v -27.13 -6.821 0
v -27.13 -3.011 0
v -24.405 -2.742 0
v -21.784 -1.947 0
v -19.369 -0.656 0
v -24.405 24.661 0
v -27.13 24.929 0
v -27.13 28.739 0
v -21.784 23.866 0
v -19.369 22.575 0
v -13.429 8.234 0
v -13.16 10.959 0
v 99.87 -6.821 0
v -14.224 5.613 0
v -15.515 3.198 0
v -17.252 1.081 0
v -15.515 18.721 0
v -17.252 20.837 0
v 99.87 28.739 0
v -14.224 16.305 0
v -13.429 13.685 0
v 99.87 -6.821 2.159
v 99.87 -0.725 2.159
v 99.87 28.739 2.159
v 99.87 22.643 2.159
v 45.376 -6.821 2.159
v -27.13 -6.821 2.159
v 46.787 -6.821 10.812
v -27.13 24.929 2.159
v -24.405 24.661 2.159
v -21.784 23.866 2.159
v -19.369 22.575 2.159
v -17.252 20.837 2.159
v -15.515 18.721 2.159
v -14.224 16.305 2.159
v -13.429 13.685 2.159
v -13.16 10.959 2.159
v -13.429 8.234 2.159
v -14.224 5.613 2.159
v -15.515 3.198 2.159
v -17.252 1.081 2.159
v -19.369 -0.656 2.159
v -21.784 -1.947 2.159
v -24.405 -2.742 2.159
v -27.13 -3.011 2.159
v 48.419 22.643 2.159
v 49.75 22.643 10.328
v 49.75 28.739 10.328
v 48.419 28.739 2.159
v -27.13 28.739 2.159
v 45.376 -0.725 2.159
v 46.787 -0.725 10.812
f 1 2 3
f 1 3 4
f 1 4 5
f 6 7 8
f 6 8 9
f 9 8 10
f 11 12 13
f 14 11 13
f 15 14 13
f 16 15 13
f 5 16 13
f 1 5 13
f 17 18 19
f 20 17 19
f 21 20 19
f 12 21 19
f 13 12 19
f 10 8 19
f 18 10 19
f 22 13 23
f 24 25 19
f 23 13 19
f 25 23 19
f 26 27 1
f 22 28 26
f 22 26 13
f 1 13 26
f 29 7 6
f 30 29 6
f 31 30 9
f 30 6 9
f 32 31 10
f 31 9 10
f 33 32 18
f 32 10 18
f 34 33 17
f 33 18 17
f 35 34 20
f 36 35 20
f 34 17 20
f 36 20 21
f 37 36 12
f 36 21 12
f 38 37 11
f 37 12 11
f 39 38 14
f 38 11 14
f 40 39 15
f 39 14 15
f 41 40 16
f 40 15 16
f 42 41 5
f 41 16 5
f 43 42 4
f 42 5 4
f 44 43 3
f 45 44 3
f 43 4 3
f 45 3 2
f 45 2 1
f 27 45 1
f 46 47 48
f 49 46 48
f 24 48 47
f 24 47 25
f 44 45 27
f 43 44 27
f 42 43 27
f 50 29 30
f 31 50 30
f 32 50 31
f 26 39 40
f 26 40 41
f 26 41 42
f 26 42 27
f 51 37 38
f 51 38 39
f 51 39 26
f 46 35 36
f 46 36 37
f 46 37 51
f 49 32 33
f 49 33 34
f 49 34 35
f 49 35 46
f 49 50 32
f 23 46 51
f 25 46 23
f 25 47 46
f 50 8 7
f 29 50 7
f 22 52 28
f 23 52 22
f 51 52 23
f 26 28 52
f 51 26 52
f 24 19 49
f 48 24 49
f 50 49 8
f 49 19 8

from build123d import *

# Parameters (mm, degrees)
F1_DEPTH = 2.159
F5_W     = 53.7838474663
F5_H     = 6.096
F5_W_2   = 50.7808425279


with BuildPart() as f1:
    # F0 (on Top) → F1 (new body)
    with BuildSketch(Plane.XY):
        with BuildLine():
            Line((-27.1301528547, -3.0107952586), (-27.1301528547, -6.8207952586))
            Line((-27.1301528547, -6.8207952586), (99.8698471453, -6.8207952586))
            Line((99.8698471453, -6.8207952586), (99.8698471453, 28.7392047414))
            Line((99.8698471453, 28.7392047414), (-27.1301528547, 28.7392047414))
            Line((-27.1301528547, 28.7392047414), (-27.1301528547, 24.9292047414))
            ThreePointArc((-27.1301528547, 24.9292047414), (-13.1601528547, 10.9592047414), (-27.1301528547, -3.0107952586))
        make_face()
    extrude(amount=F1_DEPTH)

    # F5 (on 3pt) → F6 (join, up to the next surface of F1)
    with BuildSketch(Plane(origin=(2.9275761968, 0, 17.9605901646), x_dir=(0.9869744889, 0, -0.1608768417), z_dir=(0.1608768417, 0, 0.9869744889))):
        with Locations((71.3297345118, -3.7727952586)):
            Rectangle(F5_W, F5_H)
        with Locations((72.8312369809, 25.6912047414)):
            Rectangle(F5_W_2, F5_H)
    extrude(until=Until.NEXT, dir=(-0.1608768417, 0, -0.9869744889))


solid = f1.part
